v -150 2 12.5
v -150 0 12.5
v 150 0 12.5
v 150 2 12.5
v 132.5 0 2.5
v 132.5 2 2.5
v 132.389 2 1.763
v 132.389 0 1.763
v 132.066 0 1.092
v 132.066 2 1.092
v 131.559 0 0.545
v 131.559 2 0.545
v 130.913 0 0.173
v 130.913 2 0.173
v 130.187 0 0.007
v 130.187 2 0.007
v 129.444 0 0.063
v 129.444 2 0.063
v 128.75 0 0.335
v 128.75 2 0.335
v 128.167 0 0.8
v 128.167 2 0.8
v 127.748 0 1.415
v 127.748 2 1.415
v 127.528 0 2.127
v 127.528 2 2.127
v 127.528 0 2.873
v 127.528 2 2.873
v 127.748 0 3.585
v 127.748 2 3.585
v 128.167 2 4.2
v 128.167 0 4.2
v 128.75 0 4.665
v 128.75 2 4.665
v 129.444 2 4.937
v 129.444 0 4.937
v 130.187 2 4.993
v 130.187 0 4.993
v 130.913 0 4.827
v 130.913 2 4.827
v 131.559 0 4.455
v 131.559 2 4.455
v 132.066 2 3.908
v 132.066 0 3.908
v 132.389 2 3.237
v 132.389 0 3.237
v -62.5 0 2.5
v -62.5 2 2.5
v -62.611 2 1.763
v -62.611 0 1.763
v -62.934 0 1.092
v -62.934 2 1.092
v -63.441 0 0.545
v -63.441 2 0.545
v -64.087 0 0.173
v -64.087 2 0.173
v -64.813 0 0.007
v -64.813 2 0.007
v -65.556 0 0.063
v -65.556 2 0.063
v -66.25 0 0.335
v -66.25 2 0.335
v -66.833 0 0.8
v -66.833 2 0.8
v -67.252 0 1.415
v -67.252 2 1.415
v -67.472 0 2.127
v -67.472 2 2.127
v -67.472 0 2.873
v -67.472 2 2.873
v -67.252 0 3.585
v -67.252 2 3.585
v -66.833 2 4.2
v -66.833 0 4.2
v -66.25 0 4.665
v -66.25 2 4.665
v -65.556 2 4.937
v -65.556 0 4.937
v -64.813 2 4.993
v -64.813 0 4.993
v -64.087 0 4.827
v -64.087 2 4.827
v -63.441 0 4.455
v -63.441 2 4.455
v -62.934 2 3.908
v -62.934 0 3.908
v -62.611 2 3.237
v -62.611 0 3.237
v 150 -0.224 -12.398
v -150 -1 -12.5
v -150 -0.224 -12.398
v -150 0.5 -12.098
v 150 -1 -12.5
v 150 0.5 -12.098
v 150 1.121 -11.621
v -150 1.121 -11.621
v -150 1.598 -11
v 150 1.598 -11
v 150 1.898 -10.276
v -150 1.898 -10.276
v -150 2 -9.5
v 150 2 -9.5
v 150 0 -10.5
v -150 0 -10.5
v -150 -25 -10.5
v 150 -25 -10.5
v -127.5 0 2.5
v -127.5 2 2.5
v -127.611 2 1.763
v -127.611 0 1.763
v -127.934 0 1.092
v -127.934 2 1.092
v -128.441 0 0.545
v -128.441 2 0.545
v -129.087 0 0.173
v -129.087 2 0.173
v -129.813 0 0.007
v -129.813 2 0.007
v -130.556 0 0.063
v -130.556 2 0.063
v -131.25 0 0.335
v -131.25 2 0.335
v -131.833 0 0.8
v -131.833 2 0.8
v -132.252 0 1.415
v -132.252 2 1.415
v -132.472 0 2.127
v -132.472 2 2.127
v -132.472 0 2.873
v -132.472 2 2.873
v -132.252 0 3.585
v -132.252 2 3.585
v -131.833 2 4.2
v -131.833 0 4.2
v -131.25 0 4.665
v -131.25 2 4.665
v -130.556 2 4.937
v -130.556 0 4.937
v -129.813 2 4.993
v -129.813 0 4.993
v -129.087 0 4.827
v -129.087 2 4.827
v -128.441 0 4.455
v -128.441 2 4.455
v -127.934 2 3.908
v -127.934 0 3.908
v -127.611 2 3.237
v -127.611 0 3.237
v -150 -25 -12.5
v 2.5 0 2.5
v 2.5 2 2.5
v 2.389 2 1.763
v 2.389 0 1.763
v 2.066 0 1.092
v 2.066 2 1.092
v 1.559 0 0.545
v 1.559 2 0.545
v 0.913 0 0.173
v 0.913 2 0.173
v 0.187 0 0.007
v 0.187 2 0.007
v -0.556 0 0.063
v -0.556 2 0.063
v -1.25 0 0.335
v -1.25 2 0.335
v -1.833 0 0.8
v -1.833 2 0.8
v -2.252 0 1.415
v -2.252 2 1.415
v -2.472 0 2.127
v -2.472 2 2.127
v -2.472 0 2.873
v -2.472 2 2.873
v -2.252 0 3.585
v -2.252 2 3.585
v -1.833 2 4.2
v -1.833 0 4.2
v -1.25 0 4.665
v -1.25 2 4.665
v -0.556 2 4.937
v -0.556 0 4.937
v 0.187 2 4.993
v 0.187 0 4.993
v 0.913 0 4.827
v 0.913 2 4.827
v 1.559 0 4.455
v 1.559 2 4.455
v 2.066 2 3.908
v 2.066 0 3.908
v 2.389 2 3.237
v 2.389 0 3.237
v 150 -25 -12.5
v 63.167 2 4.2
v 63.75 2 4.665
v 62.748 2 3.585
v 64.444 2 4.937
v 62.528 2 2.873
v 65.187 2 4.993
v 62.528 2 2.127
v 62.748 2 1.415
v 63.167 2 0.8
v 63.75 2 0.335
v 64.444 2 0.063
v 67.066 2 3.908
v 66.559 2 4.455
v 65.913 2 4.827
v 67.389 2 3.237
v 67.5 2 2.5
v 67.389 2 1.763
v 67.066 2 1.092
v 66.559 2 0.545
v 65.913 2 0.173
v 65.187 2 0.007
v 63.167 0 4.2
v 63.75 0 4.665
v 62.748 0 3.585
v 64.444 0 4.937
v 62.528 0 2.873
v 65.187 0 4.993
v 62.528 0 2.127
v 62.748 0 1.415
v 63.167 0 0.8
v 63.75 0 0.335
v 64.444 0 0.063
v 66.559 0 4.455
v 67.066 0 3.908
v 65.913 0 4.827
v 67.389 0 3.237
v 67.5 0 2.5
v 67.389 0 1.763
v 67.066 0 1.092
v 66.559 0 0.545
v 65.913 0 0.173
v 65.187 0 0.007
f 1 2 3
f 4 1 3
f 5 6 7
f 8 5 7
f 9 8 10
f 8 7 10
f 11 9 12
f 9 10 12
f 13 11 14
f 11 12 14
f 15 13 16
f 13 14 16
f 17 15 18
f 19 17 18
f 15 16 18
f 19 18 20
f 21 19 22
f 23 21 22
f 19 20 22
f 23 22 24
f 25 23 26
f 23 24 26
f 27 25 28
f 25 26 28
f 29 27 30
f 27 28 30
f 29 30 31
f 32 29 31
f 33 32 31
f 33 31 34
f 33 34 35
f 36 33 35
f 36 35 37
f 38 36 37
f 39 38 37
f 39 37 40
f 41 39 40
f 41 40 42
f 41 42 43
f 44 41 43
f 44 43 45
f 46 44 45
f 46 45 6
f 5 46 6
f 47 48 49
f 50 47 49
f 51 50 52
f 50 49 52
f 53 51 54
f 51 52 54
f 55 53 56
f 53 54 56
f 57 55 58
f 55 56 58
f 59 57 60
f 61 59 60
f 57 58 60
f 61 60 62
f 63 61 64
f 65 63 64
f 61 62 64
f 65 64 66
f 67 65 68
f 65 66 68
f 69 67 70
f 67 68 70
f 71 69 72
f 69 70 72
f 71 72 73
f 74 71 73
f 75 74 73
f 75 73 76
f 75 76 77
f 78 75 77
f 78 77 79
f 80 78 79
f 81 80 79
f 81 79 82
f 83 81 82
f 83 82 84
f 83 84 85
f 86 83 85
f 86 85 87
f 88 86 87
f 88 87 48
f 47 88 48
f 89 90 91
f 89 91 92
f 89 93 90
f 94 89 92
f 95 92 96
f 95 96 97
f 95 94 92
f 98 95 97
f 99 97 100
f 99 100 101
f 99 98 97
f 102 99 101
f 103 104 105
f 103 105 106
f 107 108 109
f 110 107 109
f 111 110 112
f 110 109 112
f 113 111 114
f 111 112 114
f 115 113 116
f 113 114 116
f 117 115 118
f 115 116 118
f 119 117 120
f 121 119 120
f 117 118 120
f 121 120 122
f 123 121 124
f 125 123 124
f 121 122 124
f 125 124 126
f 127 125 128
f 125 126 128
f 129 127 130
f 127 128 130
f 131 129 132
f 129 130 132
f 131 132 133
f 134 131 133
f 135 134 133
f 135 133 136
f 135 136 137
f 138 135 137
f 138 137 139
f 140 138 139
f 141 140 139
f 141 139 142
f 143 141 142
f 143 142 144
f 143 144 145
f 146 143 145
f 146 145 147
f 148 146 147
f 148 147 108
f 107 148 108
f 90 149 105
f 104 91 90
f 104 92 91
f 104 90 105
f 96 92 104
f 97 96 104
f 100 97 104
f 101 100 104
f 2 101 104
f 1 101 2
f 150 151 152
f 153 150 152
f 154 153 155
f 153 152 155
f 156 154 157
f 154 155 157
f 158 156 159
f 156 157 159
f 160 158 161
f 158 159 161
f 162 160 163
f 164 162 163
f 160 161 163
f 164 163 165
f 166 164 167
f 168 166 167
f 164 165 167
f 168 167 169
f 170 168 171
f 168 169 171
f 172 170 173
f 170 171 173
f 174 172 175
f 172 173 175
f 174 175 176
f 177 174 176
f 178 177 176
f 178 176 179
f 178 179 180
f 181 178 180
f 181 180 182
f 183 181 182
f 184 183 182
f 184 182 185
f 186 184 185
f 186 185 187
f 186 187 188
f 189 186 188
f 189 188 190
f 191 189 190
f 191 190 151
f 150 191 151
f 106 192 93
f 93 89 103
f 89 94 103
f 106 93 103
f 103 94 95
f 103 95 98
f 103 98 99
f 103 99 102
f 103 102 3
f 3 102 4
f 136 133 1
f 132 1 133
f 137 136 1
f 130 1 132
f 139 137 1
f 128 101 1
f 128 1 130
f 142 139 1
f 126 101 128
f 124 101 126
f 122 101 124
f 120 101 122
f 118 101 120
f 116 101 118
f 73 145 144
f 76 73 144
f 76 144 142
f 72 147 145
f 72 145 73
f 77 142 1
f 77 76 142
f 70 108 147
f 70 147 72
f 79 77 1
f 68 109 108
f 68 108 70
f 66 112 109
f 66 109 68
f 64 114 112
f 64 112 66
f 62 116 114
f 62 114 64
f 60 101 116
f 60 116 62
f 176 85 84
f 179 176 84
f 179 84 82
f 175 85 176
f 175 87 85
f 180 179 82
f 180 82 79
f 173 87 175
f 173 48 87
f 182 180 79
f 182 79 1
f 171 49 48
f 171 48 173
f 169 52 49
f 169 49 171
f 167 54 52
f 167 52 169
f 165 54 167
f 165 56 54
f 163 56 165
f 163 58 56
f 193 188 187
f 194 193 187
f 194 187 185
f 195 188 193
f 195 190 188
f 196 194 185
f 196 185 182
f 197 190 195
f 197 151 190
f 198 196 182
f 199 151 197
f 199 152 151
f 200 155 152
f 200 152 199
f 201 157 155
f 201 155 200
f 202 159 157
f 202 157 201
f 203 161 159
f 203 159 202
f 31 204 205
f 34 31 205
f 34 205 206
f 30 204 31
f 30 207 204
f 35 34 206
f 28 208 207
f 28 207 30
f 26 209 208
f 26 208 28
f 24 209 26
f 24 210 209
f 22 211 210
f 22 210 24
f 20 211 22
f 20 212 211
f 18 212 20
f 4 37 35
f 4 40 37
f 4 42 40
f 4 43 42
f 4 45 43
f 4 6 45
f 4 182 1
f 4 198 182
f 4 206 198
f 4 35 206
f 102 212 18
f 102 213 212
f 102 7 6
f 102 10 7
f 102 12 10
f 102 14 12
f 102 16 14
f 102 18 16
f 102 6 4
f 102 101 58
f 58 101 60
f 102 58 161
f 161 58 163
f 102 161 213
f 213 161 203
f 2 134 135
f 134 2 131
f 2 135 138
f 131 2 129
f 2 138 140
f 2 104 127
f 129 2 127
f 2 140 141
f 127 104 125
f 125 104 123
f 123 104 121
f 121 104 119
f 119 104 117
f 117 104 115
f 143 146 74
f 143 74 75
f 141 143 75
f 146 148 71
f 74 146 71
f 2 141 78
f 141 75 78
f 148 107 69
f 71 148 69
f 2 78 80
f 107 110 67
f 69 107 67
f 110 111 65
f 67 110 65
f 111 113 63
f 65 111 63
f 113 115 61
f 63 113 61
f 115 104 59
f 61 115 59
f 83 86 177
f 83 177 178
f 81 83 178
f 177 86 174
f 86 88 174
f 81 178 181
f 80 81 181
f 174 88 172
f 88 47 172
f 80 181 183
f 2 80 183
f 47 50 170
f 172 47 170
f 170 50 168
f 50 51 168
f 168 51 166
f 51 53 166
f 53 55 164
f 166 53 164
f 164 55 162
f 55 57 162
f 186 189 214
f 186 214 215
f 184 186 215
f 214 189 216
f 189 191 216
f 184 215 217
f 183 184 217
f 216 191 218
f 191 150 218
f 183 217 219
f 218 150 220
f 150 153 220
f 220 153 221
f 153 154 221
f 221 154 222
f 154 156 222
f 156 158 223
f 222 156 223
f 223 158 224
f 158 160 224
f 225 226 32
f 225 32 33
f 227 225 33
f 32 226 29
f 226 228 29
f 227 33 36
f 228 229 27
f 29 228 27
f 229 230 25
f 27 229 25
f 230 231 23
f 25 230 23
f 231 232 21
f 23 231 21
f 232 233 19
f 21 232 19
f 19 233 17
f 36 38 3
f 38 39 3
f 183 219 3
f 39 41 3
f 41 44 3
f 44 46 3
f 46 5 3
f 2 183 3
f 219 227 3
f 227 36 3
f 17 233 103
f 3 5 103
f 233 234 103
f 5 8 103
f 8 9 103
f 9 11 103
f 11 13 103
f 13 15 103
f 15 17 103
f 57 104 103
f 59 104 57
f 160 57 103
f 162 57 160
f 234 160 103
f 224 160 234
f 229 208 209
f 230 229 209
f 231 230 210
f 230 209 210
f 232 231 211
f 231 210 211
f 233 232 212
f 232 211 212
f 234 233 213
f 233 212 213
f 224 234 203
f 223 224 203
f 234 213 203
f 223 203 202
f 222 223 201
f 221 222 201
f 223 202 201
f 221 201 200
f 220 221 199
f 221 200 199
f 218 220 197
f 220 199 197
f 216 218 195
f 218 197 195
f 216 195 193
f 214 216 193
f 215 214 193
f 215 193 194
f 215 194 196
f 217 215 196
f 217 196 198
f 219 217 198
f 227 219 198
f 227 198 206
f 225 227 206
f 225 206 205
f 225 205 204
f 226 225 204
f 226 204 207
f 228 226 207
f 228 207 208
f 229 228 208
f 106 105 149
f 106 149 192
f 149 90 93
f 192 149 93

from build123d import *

# Parameters (mm, degrees)
ESBO_O1_W                = 300
ESBO_O1_H                = 25
RESSALTO_EXTRUS_O1_DEPTH = 2
ESBO_O2_R                = 2.5
CORTE_EXTRUS_O1_DEPTH    = 3
ESBO_O3_W                = 300
ESBO_O3_H                = 2
RESSALTO_EXTRUS_O2_DEPTH = 25
FILETE1_R                = 3


with BuildPart() as part:
    # Esboço1 → Ressalto-extrusão1 (new body)
    with BuildSketch(Plane(origin=(0, 0, 0), x_dir=(1, 0, 0), z_dir=(0, 1, 0))):
        Rectangle(ESBO_O1_W, ESBO_O1_H)
    extrude(amount=RESSALTO_EXTRUS_O1_DEPTH)

    # Esboço2 → Corte-extrusão1 (cut, through all)
    with BuildSketch(Plane(origin=(0, 2, 0), x_dir=(1, 0, 0), z_dir=(0, 1, 0))):
        with Locations((-130, -2.5)):
            Circle(ESBO_O2_R)
        with Locations((-65, -2.5)):
            Circle(ESBO_O2_R)
        with Locations((0, -2.5)):
            Circle(ESBO_O2_R)
        with Locations((65, -2.5)):
            Circle(ESBO_O2_R)
        with Locations((130, -2.5)):
            Circle(ESBO_O2_R)
    extrude(amount=-CORTE_EXTRUS_O1_DEPTH, mode=Mode.SUBTRACT)

    # Esboço3 → Ressalto-extrusão2 (add)
    with BuildSketch(Plane.XZ):
        with Locations((0, -11.5)):
            Rectangle(ESBO_O3_W, ESBO_O3_H)
    extrude(amount=RESSALTO_EXTRUS_O2_DEPTH)

    # Filete1
    filete1_edges = [part.edges().sort_by_distance(p)[0] for p in [
        (0, 2, -12.5),
    ]]
    fillet(filete1_edges, radius=FILETE1_R)


solid = part.part
